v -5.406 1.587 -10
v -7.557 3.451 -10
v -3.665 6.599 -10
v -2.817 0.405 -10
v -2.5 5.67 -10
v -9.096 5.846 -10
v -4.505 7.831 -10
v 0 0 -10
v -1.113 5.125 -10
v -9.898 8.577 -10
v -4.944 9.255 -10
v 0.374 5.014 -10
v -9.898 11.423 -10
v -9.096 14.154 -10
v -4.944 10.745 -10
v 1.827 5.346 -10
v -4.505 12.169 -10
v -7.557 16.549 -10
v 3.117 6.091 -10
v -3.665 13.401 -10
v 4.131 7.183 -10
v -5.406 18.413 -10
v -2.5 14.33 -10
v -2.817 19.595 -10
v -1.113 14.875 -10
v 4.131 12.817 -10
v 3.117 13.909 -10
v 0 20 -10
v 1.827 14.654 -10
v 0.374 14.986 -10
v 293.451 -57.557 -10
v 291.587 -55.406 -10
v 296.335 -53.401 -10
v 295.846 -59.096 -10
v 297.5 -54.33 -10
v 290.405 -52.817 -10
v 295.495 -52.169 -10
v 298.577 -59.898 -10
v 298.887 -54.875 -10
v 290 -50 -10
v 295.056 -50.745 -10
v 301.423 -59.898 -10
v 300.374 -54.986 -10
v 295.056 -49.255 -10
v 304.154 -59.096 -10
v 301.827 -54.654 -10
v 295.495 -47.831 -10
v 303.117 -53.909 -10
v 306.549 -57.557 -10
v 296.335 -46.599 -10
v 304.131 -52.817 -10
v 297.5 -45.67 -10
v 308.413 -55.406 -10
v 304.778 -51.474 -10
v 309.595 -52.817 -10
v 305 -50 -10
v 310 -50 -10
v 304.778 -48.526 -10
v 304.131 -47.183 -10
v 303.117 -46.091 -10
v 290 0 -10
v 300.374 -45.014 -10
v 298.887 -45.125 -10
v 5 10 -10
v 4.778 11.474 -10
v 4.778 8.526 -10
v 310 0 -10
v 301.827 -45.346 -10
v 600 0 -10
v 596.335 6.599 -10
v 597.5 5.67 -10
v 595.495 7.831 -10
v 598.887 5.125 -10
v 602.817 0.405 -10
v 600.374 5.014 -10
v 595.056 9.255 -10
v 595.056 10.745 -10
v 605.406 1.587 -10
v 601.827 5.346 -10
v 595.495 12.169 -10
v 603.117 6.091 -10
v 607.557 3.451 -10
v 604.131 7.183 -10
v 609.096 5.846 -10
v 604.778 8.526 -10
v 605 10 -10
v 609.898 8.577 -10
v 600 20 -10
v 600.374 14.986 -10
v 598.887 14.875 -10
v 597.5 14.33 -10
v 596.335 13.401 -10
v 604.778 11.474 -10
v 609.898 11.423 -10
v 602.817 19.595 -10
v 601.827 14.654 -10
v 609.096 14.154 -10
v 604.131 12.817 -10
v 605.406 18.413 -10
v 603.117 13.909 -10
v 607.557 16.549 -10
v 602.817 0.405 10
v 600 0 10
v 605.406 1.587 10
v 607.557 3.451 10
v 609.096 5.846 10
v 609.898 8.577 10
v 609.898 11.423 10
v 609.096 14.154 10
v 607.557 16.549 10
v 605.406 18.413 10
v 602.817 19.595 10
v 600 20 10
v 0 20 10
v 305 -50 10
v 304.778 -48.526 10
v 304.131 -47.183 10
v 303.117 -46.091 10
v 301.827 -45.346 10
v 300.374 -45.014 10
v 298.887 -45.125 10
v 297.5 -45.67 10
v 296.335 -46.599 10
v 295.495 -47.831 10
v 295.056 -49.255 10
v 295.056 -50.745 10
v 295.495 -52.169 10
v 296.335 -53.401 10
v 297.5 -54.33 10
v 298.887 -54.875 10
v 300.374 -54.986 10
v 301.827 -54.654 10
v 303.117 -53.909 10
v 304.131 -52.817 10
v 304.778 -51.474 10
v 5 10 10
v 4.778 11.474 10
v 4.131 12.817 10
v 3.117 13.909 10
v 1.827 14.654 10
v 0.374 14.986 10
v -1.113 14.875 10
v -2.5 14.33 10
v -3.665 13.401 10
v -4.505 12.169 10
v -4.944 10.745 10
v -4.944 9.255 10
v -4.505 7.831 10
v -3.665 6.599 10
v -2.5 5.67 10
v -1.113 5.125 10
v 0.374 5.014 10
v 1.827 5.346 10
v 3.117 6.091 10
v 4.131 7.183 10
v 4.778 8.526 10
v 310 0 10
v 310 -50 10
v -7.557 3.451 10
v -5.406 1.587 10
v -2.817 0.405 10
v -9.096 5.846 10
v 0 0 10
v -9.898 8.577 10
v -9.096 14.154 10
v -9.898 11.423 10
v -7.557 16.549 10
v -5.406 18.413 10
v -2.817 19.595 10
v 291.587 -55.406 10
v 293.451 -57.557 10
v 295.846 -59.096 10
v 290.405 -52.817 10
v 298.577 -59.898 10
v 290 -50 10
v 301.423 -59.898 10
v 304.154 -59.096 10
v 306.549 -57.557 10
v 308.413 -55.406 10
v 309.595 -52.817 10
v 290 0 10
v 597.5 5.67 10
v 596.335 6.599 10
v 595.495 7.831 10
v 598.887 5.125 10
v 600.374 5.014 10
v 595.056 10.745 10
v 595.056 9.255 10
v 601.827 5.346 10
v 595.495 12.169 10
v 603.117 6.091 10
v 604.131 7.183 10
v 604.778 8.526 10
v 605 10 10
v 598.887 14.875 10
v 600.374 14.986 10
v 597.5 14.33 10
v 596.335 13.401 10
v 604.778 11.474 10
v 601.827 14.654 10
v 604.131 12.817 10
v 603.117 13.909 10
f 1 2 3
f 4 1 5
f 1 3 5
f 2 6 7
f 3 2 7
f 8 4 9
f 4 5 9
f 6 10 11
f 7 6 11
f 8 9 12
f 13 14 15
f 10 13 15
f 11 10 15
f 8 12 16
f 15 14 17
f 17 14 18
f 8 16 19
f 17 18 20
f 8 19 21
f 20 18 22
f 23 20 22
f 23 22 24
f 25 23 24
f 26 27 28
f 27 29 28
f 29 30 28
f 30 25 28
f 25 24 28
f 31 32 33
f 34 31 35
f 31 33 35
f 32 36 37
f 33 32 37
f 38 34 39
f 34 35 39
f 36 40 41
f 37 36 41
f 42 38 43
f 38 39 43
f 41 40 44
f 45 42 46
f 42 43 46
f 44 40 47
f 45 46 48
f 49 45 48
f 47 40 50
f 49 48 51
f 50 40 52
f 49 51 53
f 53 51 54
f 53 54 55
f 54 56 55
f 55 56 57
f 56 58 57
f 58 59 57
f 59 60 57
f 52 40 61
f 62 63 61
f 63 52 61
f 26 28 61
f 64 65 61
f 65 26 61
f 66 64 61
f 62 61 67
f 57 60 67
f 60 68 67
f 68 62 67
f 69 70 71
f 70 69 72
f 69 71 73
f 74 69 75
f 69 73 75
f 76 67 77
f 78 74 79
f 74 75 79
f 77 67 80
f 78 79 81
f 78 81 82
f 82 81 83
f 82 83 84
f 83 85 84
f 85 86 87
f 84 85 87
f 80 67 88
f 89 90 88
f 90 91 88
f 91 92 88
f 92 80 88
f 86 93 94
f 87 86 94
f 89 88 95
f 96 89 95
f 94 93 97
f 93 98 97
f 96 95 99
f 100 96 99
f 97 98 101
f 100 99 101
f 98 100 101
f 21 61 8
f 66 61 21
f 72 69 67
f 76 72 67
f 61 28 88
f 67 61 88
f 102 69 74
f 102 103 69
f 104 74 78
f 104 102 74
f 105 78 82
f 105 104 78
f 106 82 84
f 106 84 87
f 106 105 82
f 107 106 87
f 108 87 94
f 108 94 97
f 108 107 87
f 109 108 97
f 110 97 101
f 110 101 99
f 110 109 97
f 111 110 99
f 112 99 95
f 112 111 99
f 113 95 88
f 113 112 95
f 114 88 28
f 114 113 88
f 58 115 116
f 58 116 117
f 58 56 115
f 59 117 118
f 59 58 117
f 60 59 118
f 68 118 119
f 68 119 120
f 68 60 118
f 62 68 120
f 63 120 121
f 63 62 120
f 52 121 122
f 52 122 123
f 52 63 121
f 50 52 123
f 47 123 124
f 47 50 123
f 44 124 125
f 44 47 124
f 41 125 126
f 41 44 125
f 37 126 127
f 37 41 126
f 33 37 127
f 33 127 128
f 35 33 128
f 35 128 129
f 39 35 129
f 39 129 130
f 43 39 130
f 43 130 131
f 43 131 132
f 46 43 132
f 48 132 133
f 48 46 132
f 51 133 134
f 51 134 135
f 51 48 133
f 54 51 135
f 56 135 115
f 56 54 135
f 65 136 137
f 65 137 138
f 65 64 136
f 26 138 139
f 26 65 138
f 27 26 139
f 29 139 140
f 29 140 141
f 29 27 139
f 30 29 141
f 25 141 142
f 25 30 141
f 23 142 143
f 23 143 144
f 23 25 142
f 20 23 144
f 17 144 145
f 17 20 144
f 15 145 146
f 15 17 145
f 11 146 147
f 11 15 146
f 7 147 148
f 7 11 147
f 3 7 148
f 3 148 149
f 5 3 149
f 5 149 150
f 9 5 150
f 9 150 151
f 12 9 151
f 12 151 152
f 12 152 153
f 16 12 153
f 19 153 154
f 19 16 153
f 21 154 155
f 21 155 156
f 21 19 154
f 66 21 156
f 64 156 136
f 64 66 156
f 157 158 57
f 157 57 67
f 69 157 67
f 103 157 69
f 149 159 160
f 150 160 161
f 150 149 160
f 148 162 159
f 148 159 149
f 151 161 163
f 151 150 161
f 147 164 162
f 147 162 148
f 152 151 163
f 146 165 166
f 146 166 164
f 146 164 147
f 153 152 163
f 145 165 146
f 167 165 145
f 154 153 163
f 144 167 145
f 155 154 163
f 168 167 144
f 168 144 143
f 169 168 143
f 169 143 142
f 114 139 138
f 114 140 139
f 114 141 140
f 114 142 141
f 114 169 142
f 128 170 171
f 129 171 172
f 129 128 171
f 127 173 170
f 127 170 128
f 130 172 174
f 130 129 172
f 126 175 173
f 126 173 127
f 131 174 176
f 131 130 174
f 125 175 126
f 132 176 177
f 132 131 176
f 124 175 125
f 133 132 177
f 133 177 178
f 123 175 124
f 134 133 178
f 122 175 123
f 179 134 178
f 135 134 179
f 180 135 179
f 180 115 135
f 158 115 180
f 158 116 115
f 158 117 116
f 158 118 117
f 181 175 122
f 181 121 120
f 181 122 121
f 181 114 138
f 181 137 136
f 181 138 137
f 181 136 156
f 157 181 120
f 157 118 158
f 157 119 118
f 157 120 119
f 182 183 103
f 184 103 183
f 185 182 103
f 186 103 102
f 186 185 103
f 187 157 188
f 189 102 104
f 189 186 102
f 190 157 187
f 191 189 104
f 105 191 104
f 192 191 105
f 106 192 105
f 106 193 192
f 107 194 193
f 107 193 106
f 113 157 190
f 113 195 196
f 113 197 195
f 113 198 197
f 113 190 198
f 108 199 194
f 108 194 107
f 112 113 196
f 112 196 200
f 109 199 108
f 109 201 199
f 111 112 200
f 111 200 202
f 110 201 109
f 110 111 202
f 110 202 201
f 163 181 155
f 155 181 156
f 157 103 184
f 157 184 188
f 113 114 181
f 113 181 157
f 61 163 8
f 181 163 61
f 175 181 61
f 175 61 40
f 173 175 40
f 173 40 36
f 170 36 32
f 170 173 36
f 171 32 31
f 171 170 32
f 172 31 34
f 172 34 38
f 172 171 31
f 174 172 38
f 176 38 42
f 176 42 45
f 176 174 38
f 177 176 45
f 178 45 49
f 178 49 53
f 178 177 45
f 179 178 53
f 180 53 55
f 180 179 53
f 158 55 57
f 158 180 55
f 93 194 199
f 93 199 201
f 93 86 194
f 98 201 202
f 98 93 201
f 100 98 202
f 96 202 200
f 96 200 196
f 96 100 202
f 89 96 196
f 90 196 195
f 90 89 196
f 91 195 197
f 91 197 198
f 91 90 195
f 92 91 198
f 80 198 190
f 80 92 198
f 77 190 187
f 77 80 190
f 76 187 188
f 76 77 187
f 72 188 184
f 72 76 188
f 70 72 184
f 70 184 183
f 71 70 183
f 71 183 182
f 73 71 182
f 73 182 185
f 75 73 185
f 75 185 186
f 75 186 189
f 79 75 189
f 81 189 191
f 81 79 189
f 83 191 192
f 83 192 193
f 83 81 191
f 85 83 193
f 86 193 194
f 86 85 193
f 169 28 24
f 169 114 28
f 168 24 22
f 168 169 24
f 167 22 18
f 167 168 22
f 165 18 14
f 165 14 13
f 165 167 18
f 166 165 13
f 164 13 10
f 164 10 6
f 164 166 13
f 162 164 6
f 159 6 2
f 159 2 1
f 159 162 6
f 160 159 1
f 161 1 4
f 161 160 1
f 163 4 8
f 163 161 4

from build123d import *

# Parameters (mm, degrees)
F0_R     = 5
F1_DEPTH = 10


with BuildPart() as f1:
    # F0 (on Top) → F1 (new body, symmetric)
    with BuildSketch(Plane.XY):
        with BuildLine():
            ThreePointArc((0, 20), (-10, 10), (0, 0))
            Line((0, 0), (290, 0))
            Line((290, 0), (290, -50))
            ThreePointArc((290, -50), (300, -60), (310, -50))
            Line((310, -50), (310, 0))
            Line((310, 0), (600, 0))
            ThreePointArc((600, 0), (610, 10), (600, 20))
            Line((600, 20), (0, 20))
        make_face()
        with Locations((300, -50)):
            Circle(F0_R, mode=Mode.SUBTRACT)
        with Locations((0, 10)):
            Circle(F0_R, mode=Mode.SUBTRACT)
        with Locations((600, 10)):
            Circle(F0_R, mode=Mode.SUBTRACT)
    extrude(amount=F1_DEPTH, both=True)


solid = f1.part
